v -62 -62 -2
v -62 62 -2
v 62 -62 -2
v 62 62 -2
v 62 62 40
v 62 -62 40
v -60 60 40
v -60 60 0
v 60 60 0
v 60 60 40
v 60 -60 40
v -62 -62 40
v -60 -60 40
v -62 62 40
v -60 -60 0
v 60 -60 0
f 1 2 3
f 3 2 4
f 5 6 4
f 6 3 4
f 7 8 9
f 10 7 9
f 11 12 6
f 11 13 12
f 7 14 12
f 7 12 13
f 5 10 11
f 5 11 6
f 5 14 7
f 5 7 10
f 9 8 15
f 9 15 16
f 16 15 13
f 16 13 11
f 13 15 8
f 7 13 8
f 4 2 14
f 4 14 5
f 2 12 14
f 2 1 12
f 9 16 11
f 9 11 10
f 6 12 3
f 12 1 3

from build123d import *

# Parameters (mm, degrees)
F0_W     = 124
F0_H     = 124
F0_W_2   = 120
F0_H_2   = 120
F1_DEPTH = 2
F2_DEPTH = 40


with BuildPart() as f1:
    # F0 (on Top) → F1 (new body)
    with BuildSketch(Plane.XY):
        Rectangle(F0_W, F0_H)
        Rectangle(F0_W_2, F0_H_2, mode=Mode.SUBTRACT)
        Rectangle(F0_W_2, F0_H_2)
    extrude(amount=-F1_DEPTH)

    # F0 (on Top) → F2 (join)
    with BuildSketch(Plane.XY):
        Rectangle(F0_W, F0_H)
        Rectangle(F0_W_2, F0_H_2, mode=Mode.SUBTRACT)
    extrude(amount=F2_DEPTH)


solid = f1.part
